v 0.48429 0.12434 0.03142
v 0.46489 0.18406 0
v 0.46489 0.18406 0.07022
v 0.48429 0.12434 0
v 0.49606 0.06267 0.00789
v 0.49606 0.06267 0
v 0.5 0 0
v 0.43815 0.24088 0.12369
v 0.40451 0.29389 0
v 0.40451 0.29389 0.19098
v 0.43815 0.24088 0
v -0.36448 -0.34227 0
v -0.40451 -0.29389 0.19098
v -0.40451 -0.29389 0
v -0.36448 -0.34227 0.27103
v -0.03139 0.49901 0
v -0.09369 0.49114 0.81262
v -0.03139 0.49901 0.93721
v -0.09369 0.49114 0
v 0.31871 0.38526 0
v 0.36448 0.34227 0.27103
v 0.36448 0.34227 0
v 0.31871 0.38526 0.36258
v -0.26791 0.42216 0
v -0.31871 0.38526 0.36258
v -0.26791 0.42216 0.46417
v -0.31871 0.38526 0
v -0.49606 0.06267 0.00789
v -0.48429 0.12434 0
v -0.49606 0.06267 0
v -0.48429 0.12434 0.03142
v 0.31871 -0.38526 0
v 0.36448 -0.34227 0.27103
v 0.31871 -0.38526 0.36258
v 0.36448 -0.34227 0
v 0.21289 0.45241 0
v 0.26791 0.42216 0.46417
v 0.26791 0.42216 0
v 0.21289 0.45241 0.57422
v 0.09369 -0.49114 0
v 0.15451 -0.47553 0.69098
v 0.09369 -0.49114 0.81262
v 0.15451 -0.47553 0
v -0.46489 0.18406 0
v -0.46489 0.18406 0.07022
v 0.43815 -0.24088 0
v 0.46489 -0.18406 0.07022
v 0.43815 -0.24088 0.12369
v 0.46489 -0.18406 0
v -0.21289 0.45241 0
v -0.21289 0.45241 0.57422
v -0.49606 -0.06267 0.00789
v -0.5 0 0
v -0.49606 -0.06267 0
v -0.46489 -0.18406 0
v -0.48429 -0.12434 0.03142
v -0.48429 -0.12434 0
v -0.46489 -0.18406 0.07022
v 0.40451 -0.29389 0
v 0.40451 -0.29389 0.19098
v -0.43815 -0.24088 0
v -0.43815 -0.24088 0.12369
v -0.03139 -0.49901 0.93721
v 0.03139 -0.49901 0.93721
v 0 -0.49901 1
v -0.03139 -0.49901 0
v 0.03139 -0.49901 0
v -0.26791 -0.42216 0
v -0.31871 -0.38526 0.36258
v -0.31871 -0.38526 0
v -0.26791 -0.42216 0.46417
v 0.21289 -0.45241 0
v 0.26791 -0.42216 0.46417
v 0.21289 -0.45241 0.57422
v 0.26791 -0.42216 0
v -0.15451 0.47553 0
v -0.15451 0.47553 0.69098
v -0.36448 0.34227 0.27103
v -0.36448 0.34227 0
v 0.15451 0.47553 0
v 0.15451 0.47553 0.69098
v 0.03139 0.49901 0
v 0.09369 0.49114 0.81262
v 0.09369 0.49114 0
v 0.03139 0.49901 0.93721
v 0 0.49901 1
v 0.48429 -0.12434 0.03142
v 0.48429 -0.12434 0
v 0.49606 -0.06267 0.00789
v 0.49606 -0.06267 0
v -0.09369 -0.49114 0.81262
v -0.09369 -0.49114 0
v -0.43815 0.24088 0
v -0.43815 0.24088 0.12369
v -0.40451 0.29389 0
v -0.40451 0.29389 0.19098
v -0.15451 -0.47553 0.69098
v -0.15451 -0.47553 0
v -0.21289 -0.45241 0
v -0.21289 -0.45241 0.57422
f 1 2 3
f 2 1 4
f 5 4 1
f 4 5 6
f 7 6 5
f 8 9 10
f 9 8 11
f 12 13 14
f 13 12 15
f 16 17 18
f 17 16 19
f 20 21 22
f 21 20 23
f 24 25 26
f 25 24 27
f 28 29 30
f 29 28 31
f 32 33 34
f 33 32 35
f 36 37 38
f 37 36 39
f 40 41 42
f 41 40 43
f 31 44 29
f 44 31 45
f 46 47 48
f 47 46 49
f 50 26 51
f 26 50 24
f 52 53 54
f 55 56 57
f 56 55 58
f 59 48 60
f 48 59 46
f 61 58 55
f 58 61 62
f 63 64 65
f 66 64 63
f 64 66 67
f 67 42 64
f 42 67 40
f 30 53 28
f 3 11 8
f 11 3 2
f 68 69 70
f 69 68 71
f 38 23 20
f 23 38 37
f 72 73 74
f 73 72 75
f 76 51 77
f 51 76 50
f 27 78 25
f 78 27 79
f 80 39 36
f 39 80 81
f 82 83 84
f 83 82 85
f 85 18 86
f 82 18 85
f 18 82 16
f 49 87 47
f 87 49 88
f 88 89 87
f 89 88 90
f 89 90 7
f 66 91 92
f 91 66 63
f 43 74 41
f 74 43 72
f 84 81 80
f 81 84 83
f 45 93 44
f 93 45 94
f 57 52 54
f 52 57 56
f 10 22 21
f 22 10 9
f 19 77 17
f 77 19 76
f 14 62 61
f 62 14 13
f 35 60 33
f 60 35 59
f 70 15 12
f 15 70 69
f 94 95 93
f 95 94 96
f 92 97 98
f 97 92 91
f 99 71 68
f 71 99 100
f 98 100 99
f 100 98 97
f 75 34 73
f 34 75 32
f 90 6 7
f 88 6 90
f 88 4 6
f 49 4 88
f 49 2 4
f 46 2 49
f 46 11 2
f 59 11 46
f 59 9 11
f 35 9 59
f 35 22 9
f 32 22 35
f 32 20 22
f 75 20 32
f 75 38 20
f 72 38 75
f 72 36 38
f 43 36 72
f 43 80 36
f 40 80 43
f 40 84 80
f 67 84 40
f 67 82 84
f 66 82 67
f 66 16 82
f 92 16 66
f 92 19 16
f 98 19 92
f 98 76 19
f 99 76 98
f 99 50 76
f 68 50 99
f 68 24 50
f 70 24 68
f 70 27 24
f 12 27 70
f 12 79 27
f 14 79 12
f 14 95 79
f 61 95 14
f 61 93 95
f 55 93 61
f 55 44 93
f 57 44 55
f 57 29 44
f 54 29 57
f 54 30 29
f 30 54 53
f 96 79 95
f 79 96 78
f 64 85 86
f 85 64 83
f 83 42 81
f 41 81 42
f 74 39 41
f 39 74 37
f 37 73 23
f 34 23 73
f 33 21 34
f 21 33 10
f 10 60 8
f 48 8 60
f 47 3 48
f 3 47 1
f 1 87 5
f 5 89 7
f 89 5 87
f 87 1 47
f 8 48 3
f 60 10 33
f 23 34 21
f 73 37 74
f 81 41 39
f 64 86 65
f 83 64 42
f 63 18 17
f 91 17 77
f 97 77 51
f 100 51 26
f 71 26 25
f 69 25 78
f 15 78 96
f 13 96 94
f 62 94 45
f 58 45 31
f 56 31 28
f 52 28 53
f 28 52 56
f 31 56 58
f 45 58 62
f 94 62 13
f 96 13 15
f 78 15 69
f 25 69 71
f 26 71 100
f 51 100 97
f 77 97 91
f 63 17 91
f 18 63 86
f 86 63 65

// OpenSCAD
// file: isosceles_triangle.scad
module isosceles_triangle() {
	polygon(
		points = [[-0.5, 0], [0.5, 0], [0, 1]],
		paths = [[0, 1, 2]]
	);
}
// file: isosceles_wedge.scad
include <isosceles_triangle.scad>;

module isosceles_wedge() {
	translate([0, 0.5, 0]) {
		rotate([90, 0, 0]) {
			linear_extrude(height = 1) {
				isosceles_triangle();
			}
		}
	}
}
// file: unit_cylinder.scad
module unit_cylinder() {
	cylinder(
		h = 1,
		r1 = 0.5,
		r2 = 0.5,
		$fn = 50
	);
}
// file: equilateral_triangle.scad
module equilateral_triangle() {
	polygon(
		points = [[-0.5, 0], [0.5, 0], [0, sqrt(3) / 2]],
		paths = [[0, 1, 2]]
	);
}
// file: isosceles_plug.scad
include <unit_cylinder.scad>;
include <isosceles_wedge.scad>;

module isosceles_plug() {
	intersection() {
		unit_cylinder();
		isosceles_wedge();
	}
}
// file: equilateral_wedge.scad
include <equilateral_triangle.scad>;

module equilateral_wedge() {
	translate([0, 0.5, 0]) {
		rotate([90, 0, 0]) {
			linear_extrude(height = 1) {
				equilateral_triangle();
			}
		}
	}
}
// main file
include <equilateral_wedge.scad>;
include <isosceles_plug.scad>;

%equilateral_wedge();
isosceles_plug();
